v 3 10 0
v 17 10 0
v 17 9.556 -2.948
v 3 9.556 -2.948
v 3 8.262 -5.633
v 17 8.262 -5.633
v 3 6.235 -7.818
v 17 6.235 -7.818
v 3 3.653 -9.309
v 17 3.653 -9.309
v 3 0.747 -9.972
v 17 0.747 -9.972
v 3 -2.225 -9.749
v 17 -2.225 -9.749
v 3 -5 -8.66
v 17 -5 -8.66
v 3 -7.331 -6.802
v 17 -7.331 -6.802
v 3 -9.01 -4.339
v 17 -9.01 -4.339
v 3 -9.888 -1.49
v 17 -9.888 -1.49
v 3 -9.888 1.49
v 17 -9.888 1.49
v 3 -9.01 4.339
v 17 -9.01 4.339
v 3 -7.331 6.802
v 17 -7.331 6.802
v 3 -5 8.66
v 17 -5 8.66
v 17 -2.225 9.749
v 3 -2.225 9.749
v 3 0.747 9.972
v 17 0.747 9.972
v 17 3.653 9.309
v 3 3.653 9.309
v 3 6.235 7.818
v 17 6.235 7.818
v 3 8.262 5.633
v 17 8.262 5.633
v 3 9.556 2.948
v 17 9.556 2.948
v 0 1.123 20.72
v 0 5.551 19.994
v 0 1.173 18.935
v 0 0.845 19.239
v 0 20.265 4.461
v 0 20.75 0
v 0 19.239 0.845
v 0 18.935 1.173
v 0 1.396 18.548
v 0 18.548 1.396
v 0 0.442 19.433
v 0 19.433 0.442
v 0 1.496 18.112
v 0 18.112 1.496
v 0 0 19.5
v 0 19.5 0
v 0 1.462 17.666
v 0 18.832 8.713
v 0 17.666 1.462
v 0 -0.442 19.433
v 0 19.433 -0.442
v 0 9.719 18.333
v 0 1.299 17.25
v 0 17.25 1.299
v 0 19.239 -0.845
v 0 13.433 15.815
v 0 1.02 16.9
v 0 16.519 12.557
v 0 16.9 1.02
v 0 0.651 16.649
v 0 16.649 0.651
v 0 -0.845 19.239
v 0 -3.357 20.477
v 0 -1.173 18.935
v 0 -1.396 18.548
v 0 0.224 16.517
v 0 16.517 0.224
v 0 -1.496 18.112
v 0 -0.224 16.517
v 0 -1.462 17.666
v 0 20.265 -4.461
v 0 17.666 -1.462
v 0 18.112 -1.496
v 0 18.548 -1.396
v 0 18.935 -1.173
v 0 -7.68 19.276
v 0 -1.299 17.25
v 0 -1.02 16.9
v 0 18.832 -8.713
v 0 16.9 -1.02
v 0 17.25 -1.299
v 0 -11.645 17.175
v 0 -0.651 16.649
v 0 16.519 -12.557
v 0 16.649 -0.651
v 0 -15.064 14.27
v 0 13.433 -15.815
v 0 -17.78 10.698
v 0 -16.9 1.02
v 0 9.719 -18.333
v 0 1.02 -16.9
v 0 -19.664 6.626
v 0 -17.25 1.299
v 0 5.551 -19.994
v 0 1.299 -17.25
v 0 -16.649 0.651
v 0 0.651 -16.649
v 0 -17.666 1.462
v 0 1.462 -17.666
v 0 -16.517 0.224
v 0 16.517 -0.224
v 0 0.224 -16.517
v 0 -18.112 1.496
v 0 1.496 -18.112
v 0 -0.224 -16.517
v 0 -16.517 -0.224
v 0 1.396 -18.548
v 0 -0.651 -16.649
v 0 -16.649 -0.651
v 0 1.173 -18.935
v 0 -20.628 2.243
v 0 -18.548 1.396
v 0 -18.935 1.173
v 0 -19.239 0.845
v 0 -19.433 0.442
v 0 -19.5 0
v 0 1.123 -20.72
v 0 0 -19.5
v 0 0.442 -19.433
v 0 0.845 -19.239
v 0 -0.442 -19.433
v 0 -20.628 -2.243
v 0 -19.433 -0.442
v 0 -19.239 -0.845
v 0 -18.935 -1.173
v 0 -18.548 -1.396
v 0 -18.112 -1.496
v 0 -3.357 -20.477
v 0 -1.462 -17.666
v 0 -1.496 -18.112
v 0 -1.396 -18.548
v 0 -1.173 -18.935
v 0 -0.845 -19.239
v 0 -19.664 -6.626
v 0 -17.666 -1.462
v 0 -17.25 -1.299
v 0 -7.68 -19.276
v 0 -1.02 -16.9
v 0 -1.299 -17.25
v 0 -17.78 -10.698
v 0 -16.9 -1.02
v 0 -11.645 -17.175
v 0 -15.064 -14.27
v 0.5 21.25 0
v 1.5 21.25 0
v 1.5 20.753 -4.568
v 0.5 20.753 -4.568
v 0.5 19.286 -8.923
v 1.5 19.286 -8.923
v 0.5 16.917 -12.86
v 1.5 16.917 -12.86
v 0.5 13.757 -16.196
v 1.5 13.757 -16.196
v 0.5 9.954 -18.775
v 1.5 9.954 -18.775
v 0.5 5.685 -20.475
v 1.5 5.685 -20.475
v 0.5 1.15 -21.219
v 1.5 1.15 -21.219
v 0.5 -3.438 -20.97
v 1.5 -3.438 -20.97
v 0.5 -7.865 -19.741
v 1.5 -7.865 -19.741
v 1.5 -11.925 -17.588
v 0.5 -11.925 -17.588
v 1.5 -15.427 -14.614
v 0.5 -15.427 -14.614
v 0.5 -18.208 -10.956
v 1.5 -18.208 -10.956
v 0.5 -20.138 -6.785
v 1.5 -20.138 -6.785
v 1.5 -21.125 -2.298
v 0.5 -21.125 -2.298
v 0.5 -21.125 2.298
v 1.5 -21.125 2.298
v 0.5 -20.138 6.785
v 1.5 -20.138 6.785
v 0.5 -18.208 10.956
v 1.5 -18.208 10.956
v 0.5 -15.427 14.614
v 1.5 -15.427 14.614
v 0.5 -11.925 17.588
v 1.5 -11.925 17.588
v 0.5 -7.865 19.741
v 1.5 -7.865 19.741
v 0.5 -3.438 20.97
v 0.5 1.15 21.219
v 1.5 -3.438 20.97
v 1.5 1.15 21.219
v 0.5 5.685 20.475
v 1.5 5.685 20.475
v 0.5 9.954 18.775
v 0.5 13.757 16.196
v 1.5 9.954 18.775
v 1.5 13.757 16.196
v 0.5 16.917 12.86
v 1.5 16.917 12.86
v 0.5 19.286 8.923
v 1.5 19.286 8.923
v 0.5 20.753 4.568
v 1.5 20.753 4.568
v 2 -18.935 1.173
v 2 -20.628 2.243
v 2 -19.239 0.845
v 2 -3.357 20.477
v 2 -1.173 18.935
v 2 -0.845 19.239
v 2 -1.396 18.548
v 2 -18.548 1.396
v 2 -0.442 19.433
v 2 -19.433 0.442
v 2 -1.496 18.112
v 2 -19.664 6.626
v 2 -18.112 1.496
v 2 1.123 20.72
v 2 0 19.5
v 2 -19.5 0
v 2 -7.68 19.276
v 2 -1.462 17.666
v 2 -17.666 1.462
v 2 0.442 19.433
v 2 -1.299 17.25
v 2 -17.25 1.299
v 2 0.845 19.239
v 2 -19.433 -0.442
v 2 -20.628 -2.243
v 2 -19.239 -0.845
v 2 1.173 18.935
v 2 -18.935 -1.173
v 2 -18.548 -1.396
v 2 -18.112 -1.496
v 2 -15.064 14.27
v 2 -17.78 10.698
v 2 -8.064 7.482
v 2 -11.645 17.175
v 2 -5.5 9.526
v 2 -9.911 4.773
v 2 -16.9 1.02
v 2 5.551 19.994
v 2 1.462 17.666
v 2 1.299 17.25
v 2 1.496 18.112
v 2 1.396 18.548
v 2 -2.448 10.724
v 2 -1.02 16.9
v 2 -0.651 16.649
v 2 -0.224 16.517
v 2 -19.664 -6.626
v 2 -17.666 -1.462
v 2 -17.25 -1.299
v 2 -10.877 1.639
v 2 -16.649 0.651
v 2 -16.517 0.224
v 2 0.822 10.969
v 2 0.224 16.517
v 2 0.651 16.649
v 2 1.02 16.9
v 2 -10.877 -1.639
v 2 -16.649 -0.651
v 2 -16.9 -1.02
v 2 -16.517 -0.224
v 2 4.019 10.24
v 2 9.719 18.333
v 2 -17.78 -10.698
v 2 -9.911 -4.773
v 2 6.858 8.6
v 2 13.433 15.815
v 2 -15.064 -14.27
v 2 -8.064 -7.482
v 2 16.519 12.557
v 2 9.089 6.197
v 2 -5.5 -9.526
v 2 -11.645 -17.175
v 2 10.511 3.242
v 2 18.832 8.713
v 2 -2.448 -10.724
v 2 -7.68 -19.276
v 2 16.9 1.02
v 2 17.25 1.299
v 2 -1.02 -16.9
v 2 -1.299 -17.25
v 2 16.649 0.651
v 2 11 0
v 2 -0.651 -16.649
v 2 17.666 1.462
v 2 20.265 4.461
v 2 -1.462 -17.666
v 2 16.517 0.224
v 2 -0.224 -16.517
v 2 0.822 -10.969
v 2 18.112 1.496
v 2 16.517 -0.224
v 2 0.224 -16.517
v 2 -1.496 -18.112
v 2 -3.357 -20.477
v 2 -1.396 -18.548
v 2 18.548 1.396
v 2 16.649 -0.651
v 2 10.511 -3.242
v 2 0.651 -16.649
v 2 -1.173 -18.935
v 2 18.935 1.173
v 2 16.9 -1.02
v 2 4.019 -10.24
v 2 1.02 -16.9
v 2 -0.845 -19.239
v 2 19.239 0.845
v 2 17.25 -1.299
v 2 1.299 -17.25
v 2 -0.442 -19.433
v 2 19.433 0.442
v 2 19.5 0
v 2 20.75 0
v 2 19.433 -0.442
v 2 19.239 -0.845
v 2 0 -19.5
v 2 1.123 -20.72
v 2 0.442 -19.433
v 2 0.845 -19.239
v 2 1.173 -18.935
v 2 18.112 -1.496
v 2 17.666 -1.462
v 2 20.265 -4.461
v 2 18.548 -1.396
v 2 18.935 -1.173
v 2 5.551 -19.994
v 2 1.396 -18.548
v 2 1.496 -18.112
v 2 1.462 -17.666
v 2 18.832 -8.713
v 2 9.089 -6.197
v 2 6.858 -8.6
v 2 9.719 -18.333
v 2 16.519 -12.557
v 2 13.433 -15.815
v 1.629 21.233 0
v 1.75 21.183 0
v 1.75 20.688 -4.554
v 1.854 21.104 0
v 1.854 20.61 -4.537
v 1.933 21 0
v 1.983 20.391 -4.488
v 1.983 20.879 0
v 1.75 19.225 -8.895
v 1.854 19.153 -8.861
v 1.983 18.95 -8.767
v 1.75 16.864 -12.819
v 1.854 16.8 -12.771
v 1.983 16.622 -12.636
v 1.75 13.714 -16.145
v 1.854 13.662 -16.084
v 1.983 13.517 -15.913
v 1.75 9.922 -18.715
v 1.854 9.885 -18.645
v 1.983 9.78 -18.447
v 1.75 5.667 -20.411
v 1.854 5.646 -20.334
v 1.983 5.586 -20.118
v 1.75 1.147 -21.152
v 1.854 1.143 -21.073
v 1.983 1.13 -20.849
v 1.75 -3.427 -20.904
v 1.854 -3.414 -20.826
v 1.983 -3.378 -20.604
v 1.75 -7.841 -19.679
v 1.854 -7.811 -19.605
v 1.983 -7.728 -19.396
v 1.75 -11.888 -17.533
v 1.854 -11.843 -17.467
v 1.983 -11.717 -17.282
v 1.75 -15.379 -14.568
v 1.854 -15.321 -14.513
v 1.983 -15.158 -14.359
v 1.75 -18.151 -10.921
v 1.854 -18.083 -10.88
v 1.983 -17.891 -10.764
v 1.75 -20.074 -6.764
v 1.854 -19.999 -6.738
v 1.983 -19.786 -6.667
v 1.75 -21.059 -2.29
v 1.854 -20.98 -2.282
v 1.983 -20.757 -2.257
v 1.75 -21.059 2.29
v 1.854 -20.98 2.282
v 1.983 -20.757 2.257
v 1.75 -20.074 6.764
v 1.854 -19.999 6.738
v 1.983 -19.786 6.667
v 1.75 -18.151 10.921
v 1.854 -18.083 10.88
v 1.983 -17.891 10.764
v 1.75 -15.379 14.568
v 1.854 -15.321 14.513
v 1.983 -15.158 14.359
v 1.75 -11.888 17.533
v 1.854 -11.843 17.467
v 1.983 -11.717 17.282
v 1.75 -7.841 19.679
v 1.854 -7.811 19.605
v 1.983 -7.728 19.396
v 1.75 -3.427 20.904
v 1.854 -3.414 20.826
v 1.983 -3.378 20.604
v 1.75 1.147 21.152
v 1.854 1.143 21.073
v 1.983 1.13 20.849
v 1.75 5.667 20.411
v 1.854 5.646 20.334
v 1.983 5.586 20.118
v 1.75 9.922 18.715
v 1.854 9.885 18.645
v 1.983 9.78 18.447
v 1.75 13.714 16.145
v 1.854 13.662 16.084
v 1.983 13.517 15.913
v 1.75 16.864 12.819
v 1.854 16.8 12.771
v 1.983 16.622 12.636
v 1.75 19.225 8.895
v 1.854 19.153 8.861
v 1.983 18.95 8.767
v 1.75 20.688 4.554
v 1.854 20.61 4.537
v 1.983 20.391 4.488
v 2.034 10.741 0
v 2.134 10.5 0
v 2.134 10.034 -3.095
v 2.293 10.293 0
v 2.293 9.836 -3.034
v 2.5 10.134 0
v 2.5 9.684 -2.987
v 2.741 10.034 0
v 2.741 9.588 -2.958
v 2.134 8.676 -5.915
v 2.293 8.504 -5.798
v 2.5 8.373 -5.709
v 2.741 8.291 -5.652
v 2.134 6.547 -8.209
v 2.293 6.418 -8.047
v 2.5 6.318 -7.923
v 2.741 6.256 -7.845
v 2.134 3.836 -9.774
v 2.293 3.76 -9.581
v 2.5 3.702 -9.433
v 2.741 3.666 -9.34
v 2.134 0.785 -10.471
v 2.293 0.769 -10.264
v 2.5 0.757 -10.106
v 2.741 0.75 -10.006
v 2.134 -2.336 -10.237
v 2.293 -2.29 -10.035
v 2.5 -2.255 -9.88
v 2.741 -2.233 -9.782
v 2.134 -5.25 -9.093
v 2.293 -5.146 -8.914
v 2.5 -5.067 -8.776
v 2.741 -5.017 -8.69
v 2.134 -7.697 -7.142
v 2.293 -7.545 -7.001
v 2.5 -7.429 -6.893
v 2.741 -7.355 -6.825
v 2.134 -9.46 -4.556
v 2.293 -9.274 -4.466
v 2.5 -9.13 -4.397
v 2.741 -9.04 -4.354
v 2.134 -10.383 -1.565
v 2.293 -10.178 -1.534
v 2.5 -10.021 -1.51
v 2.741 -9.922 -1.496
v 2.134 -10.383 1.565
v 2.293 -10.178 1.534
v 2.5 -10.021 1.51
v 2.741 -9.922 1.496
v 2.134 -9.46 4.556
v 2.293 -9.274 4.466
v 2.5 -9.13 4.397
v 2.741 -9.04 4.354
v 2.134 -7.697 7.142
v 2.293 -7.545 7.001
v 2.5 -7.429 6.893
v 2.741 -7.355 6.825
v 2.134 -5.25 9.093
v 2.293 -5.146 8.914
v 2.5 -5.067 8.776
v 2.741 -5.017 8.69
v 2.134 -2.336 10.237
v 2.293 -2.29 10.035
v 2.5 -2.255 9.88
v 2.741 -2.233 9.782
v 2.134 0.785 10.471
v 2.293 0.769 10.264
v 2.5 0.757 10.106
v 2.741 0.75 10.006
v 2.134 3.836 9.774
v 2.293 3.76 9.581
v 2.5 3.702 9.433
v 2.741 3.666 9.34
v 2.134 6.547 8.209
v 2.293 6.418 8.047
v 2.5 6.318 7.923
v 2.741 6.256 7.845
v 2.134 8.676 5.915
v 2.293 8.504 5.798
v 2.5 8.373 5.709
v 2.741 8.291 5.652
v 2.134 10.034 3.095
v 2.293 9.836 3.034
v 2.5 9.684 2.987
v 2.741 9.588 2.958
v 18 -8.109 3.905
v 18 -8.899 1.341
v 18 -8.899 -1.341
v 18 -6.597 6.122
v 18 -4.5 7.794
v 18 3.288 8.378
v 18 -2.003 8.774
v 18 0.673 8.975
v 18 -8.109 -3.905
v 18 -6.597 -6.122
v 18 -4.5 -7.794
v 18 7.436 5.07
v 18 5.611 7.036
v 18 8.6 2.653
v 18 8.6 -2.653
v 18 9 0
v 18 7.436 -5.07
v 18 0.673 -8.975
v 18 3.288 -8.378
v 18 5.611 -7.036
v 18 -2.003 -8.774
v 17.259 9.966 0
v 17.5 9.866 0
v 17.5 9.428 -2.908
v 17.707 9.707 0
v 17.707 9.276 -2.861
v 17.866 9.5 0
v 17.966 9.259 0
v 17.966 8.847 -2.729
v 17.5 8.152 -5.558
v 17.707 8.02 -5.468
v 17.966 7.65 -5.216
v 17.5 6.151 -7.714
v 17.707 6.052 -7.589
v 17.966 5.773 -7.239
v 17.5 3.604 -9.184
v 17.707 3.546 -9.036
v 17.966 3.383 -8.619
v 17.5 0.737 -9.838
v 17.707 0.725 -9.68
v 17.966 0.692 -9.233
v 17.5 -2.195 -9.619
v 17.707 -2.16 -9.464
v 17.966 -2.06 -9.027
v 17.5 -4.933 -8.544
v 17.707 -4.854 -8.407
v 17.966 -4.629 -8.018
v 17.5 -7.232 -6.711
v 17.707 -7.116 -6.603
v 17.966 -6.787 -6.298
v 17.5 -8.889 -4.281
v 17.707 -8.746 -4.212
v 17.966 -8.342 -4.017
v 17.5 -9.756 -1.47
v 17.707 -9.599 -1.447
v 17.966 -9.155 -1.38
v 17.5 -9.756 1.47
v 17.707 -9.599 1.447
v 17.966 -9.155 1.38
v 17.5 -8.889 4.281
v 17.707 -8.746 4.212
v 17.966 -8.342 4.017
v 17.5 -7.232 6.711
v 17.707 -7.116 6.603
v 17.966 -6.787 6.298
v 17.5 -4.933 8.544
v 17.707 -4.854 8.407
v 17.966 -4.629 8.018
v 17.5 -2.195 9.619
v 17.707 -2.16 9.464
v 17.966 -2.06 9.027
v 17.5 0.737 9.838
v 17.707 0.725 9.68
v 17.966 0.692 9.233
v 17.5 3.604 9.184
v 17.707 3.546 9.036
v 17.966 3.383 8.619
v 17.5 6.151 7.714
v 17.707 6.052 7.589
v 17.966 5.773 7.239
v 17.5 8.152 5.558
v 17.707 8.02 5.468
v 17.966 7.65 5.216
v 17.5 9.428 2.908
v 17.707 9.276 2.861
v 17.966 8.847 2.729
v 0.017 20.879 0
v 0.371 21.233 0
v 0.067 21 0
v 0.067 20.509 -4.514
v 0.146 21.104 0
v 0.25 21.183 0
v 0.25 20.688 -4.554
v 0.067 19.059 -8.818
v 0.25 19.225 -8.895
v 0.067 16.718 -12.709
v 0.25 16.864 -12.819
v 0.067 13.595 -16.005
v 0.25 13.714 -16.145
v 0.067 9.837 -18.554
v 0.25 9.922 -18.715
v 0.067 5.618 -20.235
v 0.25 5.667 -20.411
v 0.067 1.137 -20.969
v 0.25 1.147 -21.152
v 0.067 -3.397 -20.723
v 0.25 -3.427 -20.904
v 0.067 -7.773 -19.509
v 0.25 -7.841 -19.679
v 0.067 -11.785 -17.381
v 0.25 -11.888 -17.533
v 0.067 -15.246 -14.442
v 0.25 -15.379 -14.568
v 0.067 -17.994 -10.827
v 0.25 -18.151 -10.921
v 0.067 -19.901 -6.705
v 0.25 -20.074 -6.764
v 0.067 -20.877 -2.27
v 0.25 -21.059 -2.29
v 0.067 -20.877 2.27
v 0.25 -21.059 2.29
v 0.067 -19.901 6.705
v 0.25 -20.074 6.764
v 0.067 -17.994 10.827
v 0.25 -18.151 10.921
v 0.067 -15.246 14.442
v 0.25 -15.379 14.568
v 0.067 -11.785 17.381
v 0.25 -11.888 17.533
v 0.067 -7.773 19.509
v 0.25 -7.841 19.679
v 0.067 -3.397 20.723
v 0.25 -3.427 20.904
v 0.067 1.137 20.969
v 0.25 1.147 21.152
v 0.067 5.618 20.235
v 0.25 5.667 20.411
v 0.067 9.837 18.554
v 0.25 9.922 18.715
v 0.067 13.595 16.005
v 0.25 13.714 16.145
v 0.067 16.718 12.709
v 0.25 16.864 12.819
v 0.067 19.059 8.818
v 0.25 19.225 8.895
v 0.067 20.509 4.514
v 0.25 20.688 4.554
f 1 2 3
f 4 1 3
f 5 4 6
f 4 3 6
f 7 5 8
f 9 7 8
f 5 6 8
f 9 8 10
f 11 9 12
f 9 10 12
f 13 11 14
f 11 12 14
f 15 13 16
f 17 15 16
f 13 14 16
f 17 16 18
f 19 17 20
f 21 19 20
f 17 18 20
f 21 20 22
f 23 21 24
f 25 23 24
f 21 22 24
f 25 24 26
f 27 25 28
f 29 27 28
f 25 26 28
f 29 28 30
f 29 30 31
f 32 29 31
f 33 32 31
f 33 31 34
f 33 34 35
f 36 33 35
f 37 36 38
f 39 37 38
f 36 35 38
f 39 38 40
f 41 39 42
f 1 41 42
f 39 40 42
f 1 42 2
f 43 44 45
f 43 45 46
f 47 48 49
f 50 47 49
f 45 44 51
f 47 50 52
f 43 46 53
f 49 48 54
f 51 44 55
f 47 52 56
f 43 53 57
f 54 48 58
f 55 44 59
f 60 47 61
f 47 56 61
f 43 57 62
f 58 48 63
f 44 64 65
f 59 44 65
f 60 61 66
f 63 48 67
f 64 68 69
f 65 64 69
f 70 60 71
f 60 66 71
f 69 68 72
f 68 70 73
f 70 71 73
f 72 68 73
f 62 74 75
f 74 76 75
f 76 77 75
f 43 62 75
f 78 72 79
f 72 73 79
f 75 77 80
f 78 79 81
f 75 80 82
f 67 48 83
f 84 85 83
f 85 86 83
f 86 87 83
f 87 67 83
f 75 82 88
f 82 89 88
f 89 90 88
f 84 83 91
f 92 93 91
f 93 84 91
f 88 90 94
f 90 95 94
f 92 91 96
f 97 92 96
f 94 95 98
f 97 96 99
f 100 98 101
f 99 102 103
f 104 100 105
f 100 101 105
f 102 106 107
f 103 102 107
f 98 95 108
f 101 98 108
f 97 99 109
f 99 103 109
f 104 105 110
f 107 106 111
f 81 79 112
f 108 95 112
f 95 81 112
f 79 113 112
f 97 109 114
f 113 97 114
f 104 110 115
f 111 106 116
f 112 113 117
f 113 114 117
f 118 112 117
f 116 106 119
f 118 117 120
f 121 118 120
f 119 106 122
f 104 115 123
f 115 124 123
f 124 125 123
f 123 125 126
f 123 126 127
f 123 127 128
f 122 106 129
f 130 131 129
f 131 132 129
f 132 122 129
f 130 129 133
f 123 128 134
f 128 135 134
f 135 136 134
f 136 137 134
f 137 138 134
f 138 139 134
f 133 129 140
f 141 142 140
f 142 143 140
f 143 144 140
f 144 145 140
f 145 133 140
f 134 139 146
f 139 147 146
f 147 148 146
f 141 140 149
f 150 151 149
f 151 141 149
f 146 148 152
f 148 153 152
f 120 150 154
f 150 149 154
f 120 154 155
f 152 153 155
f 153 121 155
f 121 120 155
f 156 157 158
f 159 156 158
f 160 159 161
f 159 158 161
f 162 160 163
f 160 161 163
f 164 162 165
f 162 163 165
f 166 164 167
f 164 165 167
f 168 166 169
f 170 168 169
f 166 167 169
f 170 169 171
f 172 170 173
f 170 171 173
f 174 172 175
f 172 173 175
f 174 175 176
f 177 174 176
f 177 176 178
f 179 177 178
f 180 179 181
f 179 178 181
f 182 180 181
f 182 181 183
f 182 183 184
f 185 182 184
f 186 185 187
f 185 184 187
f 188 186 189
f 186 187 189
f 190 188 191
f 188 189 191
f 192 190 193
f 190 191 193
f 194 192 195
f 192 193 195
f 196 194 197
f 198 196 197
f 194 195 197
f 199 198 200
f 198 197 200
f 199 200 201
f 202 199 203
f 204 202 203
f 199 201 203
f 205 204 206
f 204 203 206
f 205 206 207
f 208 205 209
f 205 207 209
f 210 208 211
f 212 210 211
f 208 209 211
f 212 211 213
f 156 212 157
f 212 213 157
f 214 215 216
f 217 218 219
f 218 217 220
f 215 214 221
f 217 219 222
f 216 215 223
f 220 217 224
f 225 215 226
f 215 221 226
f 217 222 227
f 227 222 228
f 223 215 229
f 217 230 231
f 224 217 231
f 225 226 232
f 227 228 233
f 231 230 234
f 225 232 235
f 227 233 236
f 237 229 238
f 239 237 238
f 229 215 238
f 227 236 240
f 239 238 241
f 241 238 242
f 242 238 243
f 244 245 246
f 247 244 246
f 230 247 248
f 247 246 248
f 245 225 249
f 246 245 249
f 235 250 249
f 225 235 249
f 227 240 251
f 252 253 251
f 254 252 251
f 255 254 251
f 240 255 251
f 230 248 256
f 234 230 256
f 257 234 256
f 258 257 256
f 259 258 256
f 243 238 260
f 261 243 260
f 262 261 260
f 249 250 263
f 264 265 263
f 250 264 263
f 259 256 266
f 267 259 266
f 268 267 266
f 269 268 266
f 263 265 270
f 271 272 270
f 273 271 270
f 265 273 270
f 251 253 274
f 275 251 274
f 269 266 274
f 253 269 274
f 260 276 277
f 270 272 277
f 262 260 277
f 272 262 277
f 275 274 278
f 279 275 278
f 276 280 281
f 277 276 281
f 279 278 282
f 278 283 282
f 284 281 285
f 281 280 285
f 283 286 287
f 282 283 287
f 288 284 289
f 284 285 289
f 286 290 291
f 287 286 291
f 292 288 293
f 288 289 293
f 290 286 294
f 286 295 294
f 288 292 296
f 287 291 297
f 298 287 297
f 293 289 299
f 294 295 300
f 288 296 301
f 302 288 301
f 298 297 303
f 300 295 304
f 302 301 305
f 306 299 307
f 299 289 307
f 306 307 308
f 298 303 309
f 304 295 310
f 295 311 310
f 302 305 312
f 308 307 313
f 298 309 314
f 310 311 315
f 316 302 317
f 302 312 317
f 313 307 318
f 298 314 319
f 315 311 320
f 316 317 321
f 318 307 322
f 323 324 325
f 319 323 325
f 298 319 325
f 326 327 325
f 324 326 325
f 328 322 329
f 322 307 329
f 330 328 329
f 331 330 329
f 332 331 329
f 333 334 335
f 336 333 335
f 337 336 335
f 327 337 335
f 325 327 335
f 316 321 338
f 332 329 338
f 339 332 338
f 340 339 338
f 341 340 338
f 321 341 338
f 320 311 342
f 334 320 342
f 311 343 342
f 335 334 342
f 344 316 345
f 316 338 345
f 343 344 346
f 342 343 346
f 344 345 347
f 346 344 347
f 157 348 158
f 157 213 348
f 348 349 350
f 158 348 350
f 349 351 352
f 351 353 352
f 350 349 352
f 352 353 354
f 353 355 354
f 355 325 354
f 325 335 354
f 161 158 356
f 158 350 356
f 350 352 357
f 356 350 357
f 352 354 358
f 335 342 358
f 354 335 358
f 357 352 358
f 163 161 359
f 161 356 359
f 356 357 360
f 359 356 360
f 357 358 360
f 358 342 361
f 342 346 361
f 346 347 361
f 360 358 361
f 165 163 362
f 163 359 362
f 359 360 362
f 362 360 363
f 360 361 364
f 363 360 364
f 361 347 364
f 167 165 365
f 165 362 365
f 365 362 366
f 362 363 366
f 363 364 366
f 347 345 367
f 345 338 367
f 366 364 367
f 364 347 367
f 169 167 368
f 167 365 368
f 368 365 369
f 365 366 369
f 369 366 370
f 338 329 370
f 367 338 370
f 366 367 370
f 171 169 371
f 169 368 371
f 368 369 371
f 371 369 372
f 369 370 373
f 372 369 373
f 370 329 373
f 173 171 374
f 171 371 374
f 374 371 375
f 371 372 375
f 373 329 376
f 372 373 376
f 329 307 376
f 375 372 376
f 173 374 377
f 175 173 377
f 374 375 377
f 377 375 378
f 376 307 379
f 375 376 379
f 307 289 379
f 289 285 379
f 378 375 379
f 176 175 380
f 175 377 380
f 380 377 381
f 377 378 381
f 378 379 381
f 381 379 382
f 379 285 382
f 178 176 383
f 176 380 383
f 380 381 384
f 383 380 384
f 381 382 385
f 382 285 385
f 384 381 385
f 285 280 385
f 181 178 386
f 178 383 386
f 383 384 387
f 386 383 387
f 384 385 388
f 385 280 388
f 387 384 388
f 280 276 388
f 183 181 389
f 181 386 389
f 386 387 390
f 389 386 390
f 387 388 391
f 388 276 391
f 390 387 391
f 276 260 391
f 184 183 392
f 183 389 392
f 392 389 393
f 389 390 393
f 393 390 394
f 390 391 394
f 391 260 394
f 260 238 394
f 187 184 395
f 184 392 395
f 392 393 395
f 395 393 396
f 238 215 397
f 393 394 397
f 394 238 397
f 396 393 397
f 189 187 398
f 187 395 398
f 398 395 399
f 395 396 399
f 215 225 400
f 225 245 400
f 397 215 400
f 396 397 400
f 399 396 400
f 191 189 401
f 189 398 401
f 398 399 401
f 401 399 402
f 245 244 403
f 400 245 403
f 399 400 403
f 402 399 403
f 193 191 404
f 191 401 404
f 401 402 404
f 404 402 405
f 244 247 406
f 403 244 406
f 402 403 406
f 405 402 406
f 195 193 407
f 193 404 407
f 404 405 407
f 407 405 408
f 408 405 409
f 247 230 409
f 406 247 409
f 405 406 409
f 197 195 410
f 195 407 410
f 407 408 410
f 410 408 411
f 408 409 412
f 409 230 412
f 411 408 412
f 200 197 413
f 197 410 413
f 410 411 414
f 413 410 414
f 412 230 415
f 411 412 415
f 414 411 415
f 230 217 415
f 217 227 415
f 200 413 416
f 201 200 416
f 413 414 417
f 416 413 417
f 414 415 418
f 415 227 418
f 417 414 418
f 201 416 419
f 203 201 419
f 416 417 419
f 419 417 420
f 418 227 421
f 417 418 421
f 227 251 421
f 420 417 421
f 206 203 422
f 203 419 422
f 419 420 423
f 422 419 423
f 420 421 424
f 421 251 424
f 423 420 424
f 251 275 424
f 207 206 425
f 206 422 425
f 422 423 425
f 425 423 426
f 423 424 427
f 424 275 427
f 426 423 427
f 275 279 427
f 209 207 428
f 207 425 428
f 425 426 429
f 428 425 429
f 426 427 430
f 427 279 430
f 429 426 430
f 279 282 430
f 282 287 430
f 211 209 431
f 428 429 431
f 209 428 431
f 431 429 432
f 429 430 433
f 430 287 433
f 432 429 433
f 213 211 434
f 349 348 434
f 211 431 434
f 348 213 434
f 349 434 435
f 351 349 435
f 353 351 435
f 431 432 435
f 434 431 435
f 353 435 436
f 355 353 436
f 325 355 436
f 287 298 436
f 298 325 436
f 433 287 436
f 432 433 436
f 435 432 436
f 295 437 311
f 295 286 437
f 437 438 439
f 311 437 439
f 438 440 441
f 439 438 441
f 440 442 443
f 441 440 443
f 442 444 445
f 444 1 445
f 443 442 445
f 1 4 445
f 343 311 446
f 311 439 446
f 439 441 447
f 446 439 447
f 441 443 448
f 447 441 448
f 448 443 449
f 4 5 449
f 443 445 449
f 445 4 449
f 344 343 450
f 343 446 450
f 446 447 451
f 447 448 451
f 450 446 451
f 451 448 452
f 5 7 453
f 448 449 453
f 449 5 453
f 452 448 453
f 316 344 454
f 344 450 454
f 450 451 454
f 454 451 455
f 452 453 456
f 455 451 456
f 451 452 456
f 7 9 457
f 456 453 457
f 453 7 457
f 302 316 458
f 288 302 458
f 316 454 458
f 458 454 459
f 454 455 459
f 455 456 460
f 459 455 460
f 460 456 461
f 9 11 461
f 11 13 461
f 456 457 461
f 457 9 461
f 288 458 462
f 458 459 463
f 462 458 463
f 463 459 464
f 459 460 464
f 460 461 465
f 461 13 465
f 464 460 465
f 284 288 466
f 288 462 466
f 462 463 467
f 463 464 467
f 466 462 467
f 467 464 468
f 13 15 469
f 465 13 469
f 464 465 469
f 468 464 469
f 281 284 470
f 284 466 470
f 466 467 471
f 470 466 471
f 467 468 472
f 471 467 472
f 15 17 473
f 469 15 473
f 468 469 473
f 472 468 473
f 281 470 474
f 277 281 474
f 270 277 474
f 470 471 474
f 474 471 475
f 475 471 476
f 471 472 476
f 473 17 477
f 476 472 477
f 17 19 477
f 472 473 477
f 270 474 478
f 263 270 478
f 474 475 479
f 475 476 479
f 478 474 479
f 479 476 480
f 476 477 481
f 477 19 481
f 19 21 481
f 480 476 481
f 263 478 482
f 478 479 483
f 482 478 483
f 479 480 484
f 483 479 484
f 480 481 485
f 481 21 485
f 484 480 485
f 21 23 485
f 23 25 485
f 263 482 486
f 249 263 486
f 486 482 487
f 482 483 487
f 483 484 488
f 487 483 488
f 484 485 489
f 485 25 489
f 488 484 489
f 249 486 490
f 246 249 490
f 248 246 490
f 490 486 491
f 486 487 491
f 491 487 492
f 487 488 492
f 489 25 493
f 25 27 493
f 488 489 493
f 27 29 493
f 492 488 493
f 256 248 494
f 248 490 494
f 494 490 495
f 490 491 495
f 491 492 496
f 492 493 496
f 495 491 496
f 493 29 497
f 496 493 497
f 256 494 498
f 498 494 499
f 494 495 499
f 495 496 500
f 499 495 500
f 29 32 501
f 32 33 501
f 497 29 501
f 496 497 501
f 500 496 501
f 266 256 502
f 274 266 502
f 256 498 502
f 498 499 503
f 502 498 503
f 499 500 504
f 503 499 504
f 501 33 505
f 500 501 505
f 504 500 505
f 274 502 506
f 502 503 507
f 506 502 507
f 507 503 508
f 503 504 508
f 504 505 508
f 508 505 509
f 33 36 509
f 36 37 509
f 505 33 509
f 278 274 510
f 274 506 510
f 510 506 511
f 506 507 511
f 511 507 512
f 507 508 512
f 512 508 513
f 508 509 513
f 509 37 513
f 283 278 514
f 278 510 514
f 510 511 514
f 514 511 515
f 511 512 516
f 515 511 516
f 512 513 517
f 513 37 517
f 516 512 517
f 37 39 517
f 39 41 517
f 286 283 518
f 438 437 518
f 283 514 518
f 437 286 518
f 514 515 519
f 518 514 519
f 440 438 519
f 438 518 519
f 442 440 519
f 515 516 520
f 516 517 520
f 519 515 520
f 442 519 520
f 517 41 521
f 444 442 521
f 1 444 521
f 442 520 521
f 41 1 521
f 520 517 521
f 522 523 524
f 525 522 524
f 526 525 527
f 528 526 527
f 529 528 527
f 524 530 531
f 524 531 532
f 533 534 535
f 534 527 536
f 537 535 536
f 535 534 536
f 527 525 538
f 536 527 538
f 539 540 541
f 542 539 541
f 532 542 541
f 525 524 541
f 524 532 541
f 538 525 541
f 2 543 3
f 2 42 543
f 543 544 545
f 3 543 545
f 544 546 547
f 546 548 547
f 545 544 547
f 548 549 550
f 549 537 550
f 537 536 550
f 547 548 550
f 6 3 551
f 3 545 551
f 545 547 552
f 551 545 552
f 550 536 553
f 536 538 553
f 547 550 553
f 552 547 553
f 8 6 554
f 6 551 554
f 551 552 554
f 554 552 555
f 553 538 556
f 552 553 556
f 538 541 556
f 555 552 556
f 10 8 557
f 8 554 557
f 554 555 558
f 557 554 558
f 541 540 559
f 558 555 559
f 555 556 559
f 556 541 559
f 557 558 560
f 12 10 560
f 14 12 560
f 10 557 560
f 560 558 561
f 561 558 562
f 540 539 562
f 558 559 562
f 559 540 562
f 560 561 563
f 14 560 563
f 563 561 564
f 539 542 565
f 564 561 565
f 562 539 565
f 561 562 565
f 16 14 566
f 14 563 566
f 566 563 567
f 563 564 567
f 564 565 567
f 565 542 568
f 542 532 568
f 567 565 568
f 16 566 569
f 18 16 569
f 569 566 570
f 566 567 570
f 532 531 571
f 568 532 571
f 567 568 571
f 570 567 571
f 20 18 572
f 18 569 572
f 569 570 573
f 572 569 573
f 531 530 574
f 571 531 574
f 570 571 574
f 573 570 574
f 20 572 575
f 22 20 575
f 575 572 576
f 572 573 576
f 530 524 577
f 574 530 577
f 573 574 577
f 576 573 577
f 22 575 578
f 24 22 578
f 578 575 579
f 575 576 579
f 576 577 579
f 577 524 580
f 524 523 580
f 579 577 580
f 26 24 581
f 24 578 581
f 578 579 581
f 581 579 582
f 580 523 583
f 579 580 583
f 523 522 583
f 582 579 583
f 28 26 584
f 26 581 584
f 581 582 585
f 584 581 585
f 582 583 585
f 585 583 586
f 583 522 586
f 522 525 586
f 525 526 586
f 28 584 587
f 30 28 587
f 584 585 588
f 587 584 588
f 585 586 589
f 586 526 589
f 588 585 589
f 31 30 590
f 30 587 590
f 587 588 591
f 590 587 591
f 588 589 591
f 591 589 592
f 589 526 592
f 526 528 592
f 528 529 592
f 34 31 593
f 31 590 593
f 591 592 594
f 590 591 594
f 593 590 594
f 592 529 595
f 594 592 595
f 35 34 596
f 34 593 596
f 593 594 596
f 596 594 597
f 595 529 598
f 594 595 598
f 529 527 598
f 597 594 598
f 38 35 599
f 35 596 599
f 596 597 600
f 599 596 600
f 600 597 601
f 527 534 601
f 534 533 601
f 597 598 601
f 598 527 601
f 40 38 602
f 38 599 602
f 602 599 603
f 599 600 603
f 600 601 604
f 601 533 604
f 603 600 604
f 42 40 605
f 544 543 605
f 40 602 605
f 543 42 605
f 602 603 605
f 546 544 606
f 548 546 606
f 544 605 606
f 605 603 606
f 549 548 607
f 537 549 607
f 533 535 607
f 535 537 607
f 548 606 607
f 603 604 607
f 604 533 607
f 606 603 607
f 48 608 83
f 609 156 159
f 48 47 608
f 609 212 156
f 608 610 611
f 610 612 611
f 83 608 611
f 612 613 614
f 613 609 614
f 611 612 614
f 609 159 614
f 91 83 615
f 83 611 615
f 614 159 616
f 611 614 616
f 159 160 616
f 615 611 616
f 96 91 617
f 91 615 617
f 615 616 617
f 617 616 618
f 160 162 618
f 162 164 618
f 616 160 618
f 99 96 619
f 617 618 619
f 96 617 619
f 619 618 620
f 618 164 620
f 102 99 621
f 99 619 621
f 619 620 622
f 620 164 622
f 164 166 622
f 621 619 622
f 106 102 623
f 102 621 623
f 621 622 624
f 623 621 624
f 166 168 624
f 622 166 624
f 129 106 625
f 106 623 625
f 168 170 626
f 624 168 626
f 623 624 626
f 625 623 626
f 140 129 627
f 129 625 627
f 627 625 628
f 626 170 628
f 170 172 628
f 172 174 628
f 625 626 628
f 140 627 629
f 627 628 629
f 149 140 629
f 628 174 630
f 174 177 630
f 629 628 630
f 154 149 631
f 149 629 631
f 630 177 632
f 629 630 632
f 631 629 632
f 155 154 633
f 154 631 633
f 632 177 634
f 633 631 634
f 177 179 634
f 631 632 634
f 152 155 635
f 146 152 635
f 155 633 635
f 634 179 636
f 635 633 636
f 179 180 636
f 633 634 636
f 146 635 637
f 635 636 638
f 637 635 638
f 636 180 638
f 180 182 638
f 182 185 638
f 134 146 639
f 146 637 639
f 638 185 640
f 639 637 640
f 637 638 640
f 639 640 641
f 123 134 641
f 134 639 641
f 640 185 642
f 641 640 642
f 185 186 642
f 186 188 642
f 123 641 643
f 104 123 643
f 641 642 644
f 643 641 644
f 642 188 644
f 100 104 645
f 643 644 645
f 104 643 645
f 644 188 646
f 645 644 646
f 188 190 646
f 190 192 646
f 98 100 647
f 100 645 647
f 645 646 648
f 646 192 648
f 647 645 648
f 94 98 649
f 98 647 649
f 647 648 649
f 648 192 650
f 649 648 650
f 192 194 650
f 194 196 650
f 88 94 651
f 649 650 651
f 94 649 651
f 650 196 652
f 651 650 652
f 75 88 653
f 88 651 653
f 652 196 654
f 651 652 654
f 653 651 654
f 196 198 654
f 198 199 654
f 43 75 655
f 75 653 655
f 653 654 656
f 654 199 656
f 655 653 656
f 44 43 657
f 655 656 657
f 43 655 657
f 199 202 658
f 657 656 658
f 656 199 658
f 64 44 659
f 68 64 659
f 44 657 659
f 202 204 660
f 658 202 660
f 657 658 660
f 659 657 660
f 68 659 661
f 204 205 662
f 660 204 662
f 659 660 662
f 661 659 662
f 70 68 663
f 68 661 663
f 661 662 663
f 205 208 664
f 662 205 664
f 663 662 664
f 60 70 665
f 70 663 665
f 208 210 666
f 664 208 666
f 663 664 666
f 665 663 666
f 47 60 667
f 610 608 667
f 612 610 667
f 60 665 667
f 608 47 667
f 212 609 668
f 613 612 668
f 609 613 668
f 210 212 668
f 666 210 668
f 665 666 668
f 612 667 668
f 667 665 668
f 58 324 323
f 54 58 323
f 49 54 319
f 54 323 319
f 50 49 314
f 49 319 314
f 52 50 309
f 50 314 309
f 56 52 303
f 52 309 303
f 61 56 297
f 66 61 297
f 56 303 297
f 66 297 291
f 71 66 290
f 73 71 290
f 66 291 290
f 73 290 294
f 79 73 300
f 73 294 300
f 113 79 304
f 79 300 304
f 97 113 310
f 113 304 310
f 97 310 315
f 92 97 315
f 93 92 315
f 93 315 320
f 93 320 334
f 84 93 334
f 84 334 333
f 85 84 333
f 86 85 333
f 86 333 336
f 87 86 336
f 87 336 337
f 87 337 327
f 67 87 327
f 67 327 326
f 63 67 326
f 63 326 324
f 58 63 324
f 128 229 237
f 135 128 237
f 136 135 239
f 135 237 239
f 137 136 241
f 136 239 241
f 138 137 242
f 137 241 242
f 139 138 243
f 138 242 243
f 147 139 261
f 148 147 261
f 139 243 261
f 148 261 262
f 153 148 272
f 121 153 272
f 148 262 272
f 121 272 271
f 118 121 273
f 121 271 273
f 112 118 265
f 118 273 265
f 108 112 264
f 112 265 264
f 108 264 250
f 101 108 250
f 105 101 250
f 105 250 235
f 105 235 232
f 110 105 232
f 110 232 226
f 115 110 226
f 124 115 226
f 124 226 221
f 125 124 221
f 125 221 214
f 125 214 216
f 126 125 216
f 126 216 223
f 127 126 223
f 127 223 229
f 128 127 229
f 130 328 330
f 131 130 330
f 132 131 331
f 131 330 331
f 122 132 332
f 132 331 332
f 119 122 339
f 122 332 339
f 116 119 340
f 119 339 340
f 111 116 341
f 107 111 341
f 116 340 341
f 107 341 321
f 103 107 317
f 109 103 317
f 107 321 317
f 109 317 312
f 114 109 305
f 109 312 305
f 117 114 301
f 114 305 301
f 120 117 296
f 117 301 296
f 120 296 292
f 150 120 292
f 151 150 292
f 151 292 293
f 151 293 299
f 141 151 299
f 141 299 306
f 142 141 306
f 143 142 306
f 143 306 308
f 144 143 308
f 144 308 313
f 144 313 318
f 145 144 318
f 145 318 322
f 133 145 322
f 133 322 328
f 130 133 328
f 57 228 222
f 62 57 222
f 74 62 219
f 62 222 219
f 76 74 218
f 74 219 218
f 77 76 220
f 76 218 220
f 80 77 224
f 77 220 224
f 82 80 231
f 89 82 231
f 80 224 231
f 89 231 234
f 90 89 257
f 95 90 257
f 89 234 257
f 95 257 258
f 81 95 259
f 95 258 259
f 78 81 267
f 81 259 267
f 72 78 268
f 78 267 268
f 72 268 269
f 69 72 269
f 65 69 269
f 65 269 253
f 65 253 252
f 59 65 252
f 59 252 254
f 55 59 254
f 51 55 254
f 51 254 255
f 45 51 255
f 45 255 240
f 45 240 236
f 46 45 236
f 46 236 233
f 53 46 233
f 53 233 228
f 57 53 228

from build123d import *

# Parameters (mm, degrees)
CUT_EXTRUDE1_REACH = 36.046
SKETCH3_R          = 1.5
CIRPATTERN1_COUNT  = 4
FILLET1_R          = 0.5
FILLET2_R          = 1


with BuildPart() as part:
    # Sketch2 → Revolve1 (revolve)
    with BuildSketch(Plane.XY):
        Polygon((0, 0), (0, 21.25), (2, 21.25), (2, 10), (18, 10), (18, 0), align=None)
    revolve(axis=Axis((18, 0, 0), (-1, 0, 0)))

    # Sketch3 → Cut-Extrude1 (cut, up to next)
    with BuildSketch(Plane(origin=(2, 0, 0), x_dir=(0, 0, -1), z_dir=(1, 0, 0)), mode=Mode.PRIVATE) as cut_extrude1_sk1:
        with Locations(Location((0, 18, 0), (0, 0, 90))):
            Circle(SKETCH3_R)
    cut_extrude1_tool1 = extrude(cut_extrude1_sk1.sketch, amount=-CUT_EXTRUDE1_REACH, mode=Mode.PRIVATE) & part.part
    cut_extrude1 = cut_extrude1_tool1.solids().sort_by_distance((2, 18, 0))[0]
    add(cut_extrude1, mode=Mode.SUBTRACT)

    # CirPattern1: Cut-Extrude1 ×4 about axis
    cirpattern1_axis = Axis((0, 0, 0), (1, 0, 0))
    for i in range(1, CIRPATTERN1_COUNT):
        add(cut_extrude1.rotate(cirpattern1_axis, i * 360 / CIRPATTERN1_COUNT), mode=Mode.SUBTRACT)

    # Fillet1
    fillet1_edges = [part.edges().sort_by_distance(p)[0] for p in [
        (2, -21.25, 0),
        (0, -21.25, 0),
    ]]
    fillet(fillet1_edges, radius=FILLET1_R)

    # Fillet2
    fillet2_edges = [part.edges().sort_by_distance(p)[0] for p in [
        (18, -10, 0),
        (2, -10, 0),
    ]]
    fillet(fillet2_edges, radius=FILLET2_R)


solid = part.part
